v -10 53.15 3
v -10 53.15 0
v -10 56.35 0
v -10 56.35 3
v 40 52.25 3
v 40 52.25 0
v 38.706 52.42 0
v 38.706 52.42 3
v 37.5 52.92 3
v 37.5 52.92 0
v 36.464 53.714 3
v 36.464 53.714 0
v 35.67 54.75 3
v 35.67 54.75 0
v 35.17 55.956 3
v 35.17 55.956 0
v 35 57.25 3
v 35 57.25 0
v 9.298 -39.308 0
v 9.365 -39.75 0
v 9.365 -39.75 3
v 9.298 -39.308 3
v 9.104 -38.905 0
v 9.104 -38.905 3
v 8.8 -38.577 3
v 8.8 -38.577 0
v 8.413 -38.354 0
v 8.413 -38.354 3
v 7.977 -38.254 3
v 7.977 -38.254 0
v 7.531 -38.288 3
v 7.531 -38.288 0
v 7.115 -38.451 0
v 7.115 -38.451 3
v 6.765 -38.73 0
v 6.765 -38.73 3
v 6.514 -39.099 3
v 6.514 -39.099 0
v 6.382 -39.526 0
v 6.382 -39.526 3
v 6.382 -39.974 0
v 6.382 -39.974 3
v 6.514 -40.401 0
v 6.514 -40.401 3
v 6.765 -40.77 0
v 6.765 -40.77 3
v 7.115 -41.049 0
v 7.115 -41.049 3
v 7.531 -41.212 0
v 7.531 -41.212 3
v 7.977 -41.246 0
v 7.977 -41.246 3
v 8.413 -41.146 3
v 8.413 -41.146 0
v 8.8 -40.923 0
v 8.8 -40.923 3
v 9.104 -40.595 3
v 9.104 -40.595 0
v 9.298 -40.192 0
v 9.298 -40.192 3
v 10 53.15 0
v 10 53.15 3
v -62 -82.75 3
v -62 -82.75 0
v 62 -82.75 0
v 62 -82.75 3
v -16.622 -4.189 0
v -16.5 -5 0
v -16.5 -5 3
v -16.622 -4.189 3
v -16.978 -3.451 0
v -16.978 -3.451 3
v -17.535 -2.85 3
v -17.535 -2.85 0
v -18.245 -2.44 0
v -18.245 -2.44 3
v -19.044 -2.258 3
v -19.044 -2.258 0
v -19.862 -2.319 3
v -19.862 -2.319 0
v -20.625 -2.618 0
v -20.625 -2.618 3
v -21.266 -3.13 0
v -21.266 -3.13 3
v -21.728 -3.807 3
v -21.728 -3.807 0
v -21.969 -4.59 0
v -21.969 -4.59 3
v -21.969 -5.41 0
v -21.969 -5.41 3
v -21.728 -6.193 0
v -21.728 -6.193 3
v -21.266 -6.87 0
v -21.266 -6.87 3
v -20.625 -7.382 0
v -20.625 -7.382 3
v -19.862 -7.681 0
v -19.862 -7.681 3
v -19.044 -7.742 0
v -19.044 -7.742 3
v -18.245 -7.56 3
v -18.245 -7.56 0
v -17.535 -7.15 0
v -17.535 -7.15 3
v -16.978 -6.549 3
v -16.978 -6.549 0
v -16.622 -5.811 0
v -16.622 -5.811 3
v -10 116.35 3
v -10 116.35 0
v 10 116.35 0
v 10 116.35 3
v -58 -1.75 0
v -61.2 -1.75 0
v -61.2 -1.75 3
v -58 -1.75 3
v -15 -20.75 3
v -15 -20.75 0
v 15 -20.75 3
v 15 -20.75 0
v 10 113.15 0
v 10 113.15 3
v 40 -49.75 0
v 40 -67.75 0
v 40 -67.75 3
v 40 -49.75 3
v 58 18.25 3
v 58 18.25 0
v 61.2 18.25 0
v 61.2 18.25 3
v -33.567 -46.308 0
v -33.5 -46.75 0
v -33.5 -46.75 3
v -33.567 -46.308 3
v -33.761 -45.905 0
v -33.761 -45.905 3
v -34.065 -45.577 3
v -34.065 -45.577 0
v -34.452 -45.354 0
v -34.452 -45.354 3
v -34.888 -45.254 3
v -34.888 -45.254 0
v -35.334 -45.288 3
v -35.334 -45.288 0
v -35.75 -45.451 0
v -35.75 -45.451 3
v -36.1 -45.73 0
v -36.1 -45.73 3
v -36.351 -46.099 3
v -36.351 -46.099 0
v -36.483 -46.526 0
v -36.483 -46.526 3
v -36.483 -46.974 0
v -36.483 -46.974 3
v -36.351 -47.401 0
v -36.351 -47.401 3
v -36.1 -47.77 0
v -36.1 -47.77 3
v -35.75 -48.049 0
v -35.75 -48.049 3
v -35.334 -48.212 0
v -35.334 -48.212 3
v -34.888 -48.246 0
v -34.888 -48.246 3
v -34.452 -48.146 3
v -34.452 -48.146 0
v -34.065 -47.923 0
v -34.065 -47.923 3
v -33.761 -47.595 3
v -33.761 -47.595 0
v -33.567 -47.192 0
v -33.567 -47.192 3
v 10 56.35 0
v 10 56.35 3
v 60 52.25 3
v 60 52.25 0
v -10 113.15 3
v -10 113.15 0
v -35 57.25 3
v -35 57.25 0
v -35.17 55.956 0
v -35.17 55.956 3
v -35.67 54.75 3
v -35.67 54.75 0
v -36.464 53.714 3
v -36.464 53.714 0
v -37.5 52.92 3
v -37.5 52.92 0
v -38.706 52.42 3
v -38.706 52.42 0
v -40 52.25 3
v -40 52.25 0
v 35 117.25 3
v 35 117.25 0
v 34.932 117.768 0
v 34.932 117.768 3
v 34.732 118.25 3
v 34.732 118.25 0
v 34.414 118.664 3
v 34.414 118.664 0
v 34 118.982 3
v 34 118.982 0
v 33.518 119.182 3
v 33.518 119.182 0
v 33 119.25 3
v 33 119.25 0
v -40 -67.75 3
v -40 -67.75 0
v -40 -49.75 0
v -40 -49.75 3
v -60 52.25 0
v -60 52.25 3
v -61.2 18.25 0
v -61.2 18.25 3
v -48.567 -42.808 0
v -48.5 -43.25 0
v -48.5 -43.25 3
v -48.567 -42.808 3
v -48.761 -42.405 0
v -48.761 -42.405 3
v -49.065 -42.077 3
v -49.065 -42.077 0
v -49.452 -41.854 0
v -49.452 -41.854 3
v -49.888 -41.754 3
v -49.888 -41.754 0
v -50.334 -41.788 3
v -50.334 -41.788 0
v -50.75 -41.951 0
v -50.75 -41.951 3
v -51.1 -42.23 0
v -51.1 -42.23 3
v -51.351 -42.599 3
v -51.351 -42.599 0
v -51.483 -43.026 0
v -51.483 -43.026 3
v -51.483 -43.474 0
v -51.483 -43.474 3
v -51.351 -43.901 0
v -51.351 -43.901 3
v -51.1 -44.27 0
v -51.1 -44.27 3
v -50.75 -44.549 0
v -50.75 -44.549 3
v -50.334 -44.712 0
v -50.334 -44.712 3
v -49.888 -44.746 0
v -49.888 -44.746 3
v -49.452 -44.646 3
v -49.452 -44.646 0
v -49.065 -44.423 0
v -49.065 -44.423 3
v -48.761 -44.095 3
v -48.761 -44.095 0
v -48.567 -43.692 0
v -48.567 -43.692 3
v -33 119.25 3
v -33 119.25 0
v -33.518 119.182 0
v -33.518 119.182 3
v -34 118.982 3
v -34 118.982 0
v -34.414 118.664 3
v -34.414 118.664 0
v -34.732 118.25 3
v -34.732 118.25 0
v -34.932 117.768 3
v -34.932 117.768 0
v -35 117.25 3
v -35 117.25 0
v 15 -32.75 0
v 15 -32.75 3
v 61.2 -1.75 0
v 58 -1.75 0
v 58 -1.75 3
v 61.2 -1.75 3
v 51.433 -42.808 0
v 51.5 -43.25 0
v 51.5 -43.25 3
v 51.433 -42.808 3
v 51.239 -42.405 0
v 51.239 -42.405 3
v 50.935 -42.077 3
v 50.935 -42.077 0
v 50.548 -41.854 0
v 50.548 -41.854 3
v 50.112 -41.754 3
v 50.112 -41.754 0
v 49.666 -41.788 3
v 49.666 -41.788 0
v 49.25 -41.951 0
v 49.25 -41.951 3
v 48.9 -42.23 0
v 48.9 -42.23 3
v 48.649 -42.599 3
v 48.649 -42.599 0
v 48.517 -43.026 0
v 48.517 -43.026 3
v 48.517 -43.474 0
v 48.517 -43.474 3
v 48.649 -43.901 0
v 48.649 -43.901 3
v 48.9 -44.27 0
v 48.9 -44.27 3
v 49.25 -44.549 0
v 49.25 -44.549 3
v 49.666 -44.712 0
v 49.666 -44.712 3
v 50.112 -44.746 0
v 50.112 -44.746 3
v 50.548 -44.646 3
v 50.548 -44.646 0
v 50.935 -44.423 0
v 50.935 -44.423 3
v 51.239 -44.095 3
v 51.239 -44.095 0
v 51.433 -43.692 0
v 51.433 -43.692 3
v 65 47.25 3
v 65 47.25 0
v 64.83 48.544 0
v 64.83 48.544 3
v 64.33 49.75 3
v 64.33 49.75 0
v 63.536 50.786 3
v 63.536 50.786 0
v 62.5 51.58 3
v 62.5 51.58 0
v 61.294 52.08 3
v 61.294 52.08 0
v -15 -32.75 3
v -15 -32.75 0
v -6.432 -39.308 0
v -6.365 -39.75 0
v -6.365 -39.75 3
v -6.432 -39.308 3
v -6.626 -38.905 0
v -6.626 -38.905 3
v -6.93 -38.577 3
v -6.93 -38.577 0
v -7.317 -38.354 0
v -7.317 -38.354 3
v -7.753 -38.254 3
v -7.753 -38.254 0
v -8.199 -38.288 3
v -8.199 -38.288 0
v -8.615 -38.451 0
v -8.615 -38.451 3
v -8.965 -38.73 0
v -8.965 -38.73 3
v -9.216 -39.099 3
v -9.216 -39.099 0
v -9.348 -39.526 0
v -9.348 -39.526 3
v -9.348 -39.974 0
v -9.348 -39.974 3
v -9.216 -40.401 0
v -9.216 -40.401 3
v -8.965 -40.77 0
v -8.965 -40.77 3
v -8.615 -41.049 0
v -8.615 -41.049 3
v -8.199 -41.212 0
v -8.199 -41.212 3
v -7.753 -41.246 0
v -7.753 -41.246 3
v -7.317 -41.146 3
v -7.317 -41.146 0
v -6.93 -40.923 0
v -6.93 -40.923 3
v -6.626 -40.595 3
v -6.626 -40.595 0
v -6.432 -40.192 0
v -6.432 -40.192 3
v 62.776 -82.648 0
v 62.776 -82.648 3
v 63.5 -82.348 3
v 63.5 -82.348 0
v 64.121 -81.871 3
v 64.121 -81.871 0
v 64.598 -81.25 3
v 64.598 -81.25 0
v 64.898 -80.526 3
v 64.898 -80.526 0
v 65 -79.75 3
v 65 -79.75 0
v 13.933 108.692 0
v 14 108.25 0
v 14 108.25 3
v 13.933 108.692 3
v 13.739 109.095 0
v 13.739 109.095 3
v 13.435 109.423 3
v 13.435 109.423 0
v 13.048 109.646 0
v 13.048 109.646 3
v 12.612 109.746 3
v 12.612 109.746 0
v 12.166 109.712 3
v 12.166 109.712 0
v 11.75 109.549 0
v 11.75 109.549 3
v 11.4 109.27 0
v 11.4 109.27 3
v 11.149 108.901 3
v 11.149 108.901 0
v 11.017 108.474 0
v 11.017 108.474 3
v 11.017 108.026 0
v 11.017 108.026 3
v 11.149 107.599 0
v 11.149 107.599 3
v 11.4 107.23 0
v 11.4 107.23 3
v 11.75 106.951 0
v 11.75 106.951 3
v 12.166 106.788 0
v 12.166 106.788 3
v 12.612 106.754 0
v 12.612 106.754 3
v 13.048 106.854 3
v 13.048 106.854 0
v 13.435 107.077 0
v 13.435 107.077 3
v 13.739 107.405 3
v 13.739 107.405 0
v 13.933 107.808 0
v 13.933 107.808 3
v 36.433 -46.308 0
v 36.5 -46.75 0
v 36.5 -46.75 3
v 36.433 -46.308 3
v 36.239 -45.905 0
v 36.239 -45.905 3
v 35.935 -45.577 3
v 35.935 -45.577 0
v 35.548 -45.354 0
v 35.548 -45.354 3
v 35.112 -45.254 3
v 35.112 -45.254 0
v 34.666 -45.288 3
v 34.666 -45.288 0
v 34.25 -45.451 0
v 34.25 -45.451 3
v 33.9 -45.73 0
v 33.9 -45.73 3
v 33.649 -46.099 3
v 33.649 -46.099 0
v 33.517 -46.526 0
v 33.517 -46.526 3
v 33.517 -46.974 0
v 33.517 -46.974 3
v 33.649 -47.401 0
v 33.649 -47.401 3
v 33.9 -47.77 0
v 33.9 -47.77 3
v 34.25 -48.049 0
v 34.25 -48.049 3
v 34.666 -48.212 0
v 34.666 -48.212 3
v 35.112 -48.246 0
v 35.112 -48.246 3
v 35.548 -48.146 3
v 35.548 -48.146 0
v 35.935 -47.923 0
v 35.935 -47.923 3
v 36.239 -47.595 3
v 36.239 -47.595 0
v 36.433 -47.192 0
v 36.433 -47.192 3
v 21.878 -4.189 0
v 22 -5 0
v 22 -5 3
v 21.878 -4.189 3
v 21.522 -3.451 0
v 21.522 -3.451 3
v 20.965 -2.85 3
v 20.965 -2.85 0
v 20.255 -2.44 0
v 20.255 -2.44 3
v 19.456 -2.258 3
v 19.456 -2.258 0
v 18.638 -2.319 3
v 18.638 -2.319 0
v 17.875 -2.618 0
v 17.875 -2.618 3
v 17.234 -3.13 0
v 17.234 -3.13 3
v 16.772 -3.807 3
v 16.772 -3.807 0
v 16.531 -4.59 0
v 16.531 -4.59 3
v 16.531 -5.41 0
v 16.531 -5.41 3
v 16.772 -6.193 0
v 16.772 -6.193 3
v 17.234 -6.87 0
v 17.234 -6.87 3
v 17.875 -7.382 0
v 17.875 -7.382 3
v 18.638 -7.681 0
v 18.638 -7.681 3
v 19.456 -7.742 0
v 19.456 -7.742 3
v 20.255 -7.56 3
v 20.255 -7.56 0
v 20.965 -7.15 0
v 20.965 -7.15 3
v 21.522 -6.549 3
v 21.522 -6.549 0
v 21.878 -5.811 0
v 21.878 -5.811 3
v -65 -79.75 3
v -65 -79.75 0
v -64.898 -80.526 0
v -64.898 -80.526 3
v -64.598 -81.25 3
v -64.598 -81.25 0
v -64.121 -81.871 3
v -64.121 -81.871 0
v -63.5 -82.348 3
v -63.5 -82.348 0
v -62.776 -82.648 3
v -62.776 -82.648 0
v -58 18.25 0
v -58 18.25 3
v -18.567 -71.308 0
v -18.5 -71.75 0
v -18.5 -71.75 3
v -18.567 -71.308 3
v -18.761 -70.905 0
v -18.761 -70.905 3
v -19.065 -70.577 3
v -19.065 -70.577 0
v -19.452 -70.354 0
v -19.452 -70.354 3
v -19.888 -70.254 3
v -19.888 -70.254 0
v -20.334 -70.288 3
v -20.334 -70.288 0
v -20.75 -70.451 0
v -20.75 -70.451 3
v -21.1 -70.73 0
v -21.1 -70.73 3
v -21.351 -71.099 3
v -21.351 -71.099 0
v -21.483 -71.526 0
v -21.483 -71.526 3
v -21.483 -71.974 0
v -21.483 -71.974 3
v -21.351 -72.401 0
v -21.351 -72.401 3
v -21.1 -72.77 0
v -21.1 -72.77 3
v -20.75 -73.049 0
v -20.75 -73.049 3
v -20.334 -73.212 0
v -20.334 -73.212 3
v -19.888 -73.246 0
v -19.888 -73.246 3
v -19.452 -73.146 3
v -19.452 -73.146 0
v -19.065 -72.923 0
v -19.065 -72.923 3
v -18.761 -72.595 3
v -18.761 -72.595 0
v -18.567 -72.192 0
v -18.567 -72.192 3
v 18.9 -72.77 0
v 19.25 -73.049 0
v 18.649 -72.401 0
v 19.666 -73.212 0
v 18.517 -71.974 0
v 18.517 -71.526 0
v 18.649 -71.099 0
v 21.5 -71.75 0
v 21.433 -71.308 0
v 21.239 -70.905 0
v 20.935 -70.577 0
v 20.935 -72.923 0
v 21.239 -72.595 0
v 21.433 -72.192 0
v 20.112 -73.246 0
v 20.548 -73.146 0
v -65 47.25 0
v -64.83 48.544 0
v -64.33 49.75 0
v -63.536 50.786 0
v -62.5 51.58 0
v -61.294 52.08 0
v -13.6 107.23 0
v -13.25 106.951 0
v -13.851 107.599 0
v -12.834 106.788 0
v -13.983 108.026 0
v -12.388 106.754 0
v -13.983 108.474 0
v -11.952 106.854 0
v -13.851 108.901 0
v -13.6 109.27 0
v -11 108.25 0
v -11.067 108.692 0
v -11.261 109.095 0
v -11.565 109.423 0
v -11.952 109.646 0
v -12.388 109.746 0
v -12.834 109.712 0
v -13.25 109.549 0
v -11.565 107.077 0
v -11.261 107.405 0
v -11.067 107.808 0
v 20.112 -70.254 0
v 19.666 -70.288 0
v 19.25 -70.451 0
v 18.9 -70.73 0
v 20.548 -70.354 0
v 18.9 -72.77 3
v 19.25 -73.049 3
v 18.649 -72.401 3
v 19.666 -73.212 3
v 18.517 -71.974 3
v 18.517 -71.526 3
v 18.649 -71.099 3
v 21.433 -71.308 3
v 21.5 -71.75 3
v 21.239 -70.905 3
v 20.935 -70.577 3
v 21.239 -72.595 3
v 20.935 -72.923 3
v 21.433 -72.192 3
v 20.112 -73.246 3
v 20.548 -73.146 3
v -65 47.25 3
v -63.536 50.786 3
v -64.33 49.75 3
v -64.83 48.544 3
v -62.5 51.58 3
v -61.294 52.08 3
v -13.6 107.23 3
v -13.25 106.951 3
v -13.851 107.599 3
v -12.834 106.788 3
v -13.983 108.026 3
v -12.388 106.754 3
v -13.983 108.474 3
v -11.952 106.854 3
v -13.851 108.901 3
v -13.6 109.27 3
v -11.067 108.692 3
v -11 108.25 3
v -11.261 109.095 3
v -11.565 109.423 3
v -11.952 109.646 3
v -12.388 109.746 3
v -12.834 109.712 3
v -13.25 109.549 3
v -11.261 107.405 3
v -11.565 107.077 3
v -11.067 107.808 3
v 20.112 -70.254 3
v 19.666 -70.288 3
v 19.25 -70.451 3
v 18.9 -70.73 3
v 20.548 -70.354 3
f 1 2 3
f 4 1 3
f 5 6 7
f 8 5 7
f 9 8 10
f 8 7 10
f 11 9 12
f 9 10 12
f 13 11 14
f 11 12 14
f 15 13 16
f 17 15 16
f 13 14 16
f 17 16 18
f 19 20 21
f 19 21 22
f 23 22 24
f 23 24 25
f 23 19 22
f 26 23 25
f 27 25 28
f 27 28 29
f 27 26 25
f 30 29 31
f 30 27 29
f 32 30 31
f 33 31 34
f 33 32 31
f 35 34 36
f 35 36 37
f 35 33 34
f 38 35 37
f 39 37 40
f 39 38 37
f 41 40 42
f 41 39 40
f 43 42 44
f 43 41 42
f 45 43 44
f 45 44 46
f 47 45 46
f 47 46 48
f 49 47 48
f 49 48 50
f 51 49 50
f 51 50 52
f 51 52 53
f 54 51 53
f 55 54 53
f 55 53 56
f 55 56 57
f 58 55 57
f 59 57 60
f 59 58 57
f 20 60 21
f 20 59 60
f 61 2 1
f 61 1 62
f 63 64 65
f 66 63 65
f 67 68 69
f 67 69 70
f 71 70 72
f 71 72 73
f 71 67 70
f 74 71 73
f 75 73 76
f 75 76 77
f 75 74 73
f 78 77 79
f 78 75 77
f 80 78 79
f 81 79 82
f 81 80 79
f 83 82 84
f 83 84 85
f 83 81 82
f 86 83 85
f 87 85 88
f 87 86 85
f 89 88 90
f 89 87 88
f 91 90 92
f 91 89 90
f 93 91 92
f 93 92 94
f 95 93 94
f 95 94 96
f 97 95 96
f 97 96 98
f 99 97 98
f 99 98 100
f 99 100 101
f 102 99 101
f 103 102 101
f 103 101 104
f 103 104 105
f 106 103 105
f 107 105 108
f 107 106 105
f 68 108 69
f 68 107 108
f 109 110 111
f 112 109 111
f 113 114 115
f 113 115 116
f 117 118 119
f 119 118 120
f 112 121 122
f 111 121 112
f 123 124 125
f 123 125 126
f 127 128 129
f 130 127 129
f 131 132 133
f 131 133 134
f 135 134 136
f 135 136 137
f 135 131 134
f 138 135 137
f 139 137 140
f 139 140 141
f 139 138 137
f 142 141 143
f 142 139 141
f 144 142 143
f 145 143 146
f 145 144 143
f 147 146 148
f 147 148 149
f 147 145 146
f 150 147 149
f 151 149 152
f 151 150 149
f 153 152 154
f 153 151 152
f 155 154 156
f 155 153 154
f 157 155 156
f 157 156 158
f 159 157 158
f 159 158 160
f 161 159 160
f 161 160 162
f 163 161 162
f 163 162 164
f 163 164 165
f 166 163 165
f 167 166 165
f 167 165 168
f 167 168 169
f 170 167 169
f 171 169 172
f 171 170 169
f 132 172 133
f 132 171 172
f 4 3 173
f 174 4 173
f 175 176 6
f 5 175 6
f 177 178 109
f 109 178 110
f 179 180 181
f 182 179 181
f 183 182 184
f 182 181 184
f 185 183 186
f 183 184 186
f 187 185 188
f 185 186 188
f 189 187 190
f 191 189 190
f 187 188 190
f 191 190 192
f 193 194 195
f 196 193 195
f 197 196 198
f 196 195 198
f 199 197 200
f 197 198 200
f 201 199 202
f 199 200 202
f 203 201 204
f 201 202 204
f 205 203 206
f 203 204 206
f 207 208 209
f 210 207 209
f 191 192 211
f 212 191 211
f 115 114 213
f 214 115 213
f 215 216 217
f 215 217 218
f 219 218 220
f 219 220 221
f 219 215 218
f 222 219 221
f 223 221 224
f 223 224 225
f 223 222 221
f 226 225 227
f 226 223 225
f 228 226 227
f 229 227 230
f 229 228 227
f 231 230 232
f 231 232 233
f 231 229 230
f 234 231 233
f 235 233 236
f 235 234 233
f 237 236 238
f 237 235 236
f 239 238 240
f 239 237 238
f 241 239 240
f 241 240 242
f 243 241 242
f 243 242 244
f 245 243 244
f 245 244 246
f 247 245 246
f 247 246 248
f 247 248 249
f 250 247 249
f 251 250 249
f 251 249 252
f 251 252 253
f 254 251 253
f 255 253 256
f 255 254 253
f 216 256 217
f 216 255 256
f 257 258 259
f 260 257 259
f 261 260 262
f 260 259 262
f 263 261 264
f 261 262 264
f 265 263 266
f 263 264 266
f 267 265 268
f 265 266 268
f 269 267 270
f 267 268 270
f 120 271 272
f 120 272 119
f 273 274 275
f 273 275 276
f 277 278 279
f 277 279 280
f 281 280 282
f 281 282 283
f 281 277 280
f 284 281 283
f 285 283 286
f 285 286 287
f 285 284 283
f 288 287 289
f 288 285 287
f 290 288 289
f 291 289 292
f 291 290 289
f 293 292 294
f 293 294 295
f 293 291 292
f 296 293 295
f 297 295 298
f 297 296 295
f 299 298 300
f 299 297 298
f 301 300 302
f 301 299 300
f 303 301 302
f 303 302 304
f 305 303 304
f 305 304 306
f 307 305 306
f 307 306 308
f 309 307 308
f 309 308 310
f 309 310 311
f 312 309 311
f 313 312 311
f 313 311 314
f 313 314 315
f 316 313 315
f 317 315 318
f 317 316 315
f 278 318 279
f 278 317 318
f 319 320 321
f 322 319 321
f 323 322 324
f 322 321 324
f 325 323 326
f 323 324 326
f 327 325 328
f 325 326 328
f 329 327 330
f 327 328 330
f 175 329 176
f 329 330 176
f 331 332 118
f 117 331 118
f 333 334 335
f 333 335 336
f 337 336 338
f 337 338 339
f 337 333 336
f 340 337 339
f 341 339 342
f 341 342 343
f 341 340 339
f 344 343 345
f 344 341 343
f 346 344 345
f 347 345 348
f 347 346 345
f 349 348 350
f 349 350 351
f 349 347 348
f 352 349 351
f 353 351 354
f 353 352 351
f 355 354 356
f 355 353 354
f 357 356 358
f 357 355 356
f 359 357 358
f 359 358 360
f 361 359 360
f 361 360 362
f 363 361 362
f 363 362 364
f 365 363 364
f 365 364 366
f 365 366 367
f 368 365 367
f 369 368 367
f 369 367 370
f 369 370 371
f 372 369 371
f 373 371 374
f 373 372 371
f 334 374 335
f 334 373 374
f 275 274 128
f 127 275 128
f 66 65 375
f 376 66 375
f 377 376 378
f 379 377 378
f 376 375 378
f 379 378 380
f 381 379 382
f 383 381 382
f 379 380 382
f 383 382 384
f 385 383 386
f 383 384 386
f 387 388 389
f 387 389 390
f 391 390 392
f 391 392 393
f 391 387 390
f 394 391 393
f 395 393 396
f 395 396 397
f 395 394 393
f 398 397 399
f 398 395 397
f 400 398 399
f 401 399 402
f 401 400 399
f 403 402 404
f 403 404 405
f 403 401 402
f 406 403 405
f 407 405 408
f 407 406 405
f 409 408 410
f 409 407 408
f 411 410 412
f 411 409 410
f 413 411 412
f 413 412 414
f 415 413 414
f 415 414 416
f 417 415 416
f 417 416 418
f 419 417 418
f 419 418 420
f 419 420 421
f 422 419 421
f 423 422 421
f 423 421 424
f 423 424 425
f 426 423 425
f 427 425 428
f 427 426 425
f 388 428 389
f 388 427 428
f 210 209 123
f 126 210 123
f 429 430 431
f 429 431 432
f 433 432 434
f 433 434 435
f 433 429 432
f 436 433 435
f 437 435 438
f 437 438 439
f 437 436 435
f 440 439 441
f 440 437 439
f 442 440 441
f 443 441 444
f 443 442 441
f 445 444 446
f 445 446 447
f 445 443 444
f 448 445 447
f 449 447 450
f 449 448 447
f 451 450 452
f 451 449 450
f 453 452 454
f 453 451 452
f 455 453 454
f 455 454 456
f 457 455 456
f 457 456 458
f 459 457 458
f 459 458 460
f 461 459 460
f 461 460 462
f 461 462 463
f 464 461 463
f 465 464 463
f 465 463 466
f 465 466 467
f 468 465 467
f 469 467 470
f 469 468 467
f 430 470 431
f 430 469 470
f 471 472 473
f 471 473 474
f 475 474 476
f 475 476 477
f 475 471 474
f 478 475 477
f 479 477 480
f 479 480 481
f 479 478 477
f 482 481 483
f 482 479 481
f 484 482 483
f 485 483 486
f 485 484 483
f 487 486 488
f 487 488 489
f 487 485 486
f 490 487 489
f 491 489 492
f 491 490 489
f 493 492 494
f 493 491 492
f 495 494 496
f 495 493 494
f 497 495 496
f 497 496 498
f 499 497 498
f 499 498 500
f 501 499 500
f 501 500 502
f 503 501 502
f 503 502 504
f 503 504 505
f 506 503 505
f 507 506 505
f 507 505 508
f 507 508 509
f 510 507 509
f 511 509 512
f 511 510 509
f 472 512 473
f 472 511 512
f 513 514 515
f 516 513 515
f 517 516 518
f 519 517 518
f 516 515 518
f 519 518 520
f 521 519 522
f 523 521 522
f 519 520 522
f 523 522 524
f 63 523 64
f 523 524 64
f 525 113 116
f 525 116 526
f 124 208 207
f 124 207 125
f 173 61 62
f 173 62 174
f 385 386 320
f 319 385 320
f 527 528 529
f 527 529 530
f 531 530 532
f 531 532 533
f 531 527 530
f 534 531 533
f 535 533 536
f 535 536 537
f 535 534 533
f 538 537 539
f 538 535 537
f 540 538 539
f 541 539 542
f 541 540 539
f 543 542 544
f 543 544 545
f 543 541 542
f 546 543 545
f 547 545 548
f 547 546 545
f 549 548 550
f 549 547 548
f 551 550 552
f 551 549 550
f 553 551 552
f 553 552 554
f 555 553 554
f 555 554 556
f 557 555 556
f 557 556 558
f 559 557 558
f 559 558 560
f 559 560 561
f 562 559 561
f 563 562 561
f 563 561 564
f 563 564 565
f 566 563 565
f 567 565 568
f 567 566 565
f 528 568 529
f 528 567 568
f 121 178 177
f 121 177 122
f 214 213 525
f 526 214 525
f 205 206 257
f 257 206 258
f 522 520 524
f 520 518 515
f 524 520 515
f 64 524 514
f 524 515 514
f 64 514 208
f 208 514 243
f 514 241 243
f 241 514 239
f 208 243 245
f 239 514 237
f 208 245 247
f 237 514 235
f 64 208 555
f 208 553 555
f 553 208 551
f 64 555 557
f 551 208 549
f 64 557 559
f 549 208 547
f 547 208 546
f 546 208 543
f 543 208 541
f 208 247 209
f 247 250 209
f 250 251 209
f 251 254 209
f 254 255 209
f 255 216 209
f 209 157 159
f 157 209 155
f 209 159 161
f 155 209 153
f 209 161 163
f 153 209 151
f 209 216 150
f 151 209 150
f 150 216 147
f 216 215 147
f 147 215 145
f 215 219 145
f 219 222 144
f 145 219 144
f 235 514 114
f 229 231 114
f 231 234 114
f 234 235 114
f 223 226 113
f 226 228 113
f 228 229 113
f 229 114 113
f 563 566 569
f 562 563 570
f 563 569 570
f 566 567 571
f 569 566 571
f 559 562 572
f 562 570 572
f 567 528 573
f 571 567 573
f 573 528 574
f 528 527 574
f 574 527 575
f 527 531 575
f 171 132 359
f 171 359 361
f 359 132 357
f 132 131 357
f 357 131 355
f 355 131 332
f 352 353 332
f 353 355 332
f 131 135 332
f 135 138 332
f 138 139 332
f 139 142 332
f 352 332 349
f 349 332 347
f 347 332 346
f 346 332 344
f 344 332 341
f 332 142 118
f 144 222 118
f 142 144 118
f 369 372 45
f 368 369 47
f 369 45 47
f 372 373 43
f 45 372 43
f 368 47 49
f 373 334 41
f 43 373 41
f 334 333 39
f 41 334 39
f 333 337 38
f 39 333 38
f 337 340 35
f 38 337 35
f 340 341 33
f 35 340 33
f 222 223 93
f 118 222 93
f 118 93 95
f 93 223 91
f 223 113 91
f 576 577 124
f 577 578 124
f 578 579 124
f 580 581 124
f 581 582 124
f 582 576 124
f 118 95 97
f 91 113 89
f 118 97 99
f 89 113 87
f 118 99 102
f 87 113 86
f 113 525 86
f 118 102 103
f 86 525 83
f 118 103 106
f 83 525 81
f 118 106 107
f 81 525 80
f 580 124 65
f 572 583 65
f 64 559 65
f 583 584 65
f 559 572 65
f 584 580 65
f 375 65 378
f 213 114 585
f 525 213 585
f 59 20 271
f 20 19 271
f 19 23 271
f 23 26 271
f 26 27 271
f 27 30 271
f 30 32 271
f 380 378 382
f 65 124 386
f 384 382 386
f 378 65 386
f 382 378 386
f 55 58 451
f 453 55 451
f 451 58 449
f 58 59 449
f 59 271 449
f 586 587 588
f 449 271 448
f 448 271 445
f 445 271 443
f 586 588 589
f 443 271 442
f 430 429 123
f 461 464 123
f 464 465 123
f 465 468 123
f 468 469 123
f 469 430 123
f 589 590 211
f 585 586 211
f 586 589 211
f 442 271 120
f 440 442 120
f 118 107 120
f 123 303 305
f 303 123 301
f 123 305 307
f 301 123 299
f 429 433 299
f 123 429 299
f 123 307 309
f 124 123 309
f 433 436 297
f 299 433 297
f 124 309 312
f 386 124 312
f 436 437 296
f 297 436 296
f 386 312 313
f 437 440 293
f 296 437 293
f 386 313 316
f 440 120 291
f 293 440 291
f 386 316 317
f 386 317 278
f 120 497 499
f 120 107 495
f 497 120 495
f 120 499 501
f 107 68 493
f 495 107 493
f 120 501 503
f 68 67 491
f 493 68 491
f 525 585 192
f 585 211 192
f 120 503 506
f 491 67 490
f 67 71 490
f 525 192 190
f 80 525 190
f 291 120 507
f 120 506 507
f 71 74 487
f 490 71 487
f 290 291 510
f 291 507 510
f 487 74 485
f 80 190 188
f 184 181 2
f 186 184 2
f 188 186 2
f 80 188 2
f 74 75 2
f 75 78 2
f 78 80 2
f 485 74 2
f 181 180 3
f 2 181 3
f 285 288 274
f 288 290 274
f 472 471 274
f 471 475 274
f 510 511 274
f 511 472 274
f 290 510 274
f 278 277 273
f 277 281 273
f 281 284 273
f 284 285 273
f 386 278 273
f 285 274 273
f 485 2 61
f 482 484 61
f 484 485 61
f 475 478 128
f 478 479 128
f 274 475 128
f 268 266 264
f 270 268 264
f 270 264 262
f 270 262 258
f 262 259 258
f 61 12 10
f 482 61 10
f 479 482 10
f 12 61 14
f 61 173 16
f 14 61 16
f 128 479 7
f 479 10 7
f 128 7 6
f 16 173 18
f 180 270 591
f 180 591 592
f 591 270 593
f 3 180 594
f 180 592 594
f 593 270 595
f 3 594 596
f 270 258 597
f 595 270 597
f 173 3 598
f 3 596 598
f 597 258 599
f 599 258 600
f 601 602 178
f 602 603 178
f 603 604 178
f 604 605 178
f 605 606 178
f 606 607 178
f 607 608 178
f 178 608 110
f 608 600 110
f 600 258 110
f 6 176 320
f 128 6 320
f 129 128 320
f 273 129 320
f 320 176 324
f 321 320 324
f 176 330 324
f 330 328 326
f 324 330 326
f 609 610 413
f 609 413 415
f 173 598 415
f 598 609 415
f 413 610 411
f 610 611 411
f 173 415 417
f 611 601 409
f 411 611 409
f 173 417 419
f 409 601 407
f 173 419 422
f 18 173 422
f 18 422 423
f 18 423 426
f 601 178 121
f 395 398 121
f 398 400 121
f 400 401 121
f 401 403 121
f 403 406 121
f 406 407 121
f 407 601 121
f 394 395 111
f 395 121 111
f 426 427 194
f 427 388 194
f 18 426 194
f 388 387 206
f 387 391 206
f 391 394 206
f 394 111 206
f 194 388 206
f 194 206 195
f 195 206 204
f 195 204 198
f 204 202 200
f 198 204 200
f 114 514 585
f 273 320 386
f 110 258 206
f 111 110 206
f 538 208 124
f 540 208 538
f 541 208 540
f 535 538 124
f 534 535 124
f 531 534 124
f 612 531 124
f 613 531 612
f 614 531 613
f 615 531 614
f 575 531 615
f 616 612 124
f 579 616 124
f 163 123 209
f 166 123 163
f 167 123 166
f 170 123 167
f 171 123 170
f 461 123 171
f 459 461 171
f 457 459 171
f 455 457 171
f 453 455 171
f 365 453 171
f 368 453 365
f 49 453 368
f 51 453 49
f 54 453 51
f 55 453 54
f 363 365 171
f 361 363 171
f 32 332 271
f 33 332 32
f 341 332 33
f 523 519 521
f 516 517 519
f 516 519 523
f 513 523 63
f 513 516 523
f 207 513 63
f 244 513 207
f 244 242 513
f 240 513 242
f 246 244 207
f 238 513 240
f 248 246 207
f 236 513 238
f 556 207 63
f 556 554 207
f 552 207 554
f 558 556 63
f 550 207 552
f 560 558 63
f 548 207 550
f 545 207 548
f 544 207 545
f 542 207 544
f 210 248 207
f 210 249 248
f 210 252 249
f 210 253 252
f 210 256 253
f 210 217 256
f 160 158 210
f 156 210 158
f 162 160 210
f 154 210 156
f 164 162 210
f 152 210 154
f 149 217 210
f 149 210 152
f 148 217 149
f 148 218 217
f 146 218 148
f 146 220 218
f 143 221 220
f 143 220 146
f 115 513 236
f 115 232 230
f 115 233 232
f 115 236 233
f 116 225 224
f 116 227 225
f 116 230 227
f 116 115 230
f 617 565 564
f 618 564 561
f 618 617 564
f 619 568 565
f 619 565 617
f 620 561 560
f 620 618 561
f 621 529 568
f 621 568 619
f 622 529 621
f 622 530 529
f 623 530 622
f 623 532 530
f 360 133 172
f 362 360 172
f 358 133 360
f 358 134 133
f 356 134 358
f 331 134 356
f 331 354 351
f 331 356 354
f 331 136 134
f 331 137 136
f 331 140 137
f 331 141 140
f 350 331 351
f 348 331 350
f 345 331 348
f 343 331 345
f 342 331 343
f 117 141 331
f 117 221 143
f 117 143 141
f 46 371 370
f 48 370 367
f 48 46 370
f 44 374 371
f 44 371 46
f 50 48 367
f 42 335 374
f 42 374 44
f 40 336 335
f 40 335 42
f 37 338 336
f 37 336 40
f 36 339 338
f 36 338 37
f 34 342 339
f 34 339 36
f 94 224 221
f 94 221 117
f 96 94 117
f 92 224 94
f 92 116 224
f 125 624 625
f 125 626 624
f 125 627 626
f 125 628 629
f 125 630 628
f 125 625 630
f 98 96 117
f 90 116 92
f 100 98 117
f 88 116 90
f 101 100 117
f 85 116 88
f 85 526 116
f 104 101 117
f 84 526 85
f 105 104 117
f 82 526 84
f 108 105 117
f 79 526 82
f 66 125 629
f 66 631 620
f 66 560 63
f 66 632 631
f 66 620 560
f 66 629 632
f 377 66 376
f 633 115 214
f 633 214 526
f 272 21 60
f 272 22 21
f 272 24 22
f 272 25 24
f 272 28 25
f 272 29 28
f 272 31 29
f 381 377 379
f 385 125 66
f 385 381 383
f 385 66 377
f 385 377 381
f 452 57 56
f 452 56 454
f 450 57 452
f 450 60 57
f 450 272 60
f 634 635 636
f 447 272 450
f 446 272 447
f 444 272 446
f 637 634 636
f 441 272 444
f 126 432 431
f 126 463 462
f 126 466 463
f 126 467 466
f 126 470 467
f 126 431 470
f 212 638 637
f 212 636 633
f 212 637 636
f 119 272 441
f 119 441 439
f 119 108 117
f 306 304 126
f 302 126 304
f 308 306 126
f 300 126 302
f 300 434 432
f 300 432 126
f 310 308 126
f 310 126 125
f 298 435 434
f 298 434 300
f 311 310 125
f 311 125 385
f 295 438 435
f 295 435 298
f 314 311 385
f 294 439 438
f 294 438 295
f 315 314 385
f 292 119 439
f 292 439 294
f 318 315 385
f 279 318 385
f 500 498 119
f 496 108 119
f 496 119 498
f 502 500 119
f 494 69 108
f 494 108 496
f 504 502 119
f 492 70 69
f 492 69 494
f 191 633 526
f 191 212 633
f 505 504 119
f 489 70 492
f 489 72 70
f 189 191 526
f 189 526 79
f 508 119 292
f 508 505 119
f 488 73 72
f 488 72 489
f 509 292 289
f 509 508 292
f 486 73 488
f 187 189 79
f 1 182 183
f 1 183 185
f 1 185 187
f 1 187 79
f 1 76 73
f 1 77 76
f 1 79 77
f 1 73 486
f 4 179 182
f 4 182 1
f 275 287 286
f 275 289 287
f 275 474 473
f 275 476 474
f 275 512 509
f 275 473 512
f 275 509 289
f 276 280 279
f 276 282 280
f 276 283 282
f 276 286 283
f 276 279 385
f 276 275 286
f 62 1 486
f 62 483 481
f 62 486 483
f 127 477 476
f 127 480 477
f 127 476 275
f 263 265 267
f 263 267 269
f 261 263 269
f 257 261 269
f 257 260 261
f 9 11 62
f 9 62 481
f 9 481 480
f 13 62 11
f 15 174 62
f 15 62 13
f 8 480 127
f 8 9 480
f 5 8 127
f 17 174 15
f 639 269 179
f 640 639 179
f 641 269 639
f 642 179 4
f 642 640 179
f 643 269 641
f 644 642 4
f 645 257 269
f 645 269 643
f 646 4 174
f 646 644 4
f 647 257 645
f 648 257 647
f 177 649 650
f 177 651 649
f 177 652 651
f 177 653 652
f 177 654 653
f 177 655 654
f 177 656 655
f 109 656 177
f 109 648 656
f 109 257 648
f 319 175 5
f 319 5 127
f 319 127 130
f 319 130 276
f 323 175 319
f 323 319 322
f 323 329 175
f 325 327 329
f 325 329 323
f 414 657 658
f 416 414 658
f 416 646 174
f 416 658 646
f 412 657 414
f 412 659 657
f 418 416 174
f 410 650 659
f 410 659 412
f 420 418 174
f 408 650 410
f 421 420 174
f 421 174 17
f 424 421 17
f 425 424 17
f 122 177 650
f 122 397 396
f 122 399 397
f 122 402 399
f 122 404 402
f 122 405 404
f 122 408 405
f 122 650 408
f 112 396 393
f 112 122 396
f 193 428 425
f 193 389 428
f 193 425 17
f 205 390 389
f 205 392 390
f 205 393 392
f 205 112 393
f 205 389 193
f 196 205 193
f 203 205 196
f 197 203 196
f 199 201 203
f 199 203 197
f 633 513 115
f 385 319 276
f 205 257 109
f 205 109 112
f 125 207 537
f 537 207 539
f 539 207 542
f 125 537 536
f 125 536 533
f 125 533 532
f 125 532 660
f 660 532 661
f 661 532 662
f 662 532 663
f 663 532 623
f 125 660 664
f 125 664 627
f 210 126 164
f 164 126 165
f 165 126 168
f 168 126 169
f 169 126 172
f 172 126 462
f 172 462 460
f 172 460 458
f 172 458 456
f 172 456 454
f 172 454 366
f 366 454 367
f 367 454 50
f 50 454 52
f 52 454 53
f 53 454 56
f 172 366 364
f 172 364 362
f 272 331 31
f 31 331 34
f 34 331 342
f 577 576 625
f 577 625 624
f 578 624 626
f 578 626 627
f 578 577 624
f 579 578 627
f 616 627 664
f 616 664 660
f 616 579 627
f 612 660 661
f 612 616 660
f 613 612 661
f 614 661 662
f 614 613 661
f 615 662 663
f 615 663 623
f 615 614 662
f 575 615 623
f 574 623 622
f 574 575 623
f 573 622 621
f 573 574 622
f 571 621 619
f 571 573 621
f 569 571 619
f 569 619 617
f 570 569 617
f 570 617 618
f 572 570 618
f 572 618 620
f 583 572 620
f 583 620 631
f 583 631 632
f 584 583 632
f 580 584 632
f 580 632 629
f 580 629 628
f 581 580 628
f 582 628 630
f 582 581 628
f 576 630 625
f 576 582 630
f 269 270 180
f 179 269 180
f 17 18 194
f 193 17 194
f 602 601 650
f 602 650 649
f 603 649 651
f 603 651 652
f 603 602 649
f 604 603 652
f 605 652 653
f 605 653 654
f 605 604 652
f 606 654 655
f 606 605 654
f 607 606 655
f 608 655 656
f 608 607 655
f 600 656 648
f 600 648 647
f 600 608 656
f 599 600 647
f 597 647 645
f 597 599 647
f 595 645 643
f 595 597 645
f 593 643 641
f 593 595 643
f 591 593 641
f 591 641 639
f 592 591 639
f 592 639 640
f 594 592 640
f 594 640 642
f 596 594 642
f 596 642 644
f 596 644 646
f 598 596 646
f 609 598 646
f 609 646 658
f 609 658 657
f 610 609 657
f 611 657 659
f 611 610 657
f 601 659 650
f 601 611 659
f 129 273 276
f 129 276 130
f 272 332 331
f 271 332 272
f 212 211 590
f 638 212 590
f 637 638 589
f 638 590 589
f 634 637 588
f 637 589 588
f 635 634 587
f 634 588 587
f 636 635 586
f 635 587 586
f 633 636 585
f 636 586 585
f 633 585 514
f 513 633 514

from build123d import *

# Parameters (mm, degrees)
SKETCH1_R           = 1.5
SKETCH1_R_2         = 2.75
SKETCH1_W           = 3.2
SKETCH1_H           = 20
SKETCH1_W_2         = 20
SKETCH1_H_2         = 3.2
SKETCH1_W_3         = 80
SKETCH1_H_3         = 18
SKETCH1_W_4         = 30
SKETCH1_H_4         = 12
BOSS_EXTRUDE2_DEPTH = 3


with BuildPart() as part:
    # Sketch1 → Boss-Extrude2 (new body)
    with BuildSketch(Plane.XY):
        with BuildLine():
            Line((-35, 117.25), (-35, 57.25))
            ThreePointArc((-35, 57.25), (-36.464466094, 53.714466094), (-40, 52.25))
            Line((-40, 52.25), (-60, 52.25))
            ThreePointArc((-60, 52.25), (-63.535533906, 50.785533906), (-65, 47.25))
            Line((-65, 47.25), (-65, -79.75))
            ThreePointArc((-65, -79.75), (-64.121320344, -81.871320344), (-62, -82.75))
            Line((-62, -82.75), (62, -82.75))
            ThreePointArc((62, -82.75), (64.121320344, -81.871320344), (65, -79.75))
            Line((65, -79.75), (65, 47.25))
            ThreePointArc((65, 47.25), (63.535533906, 50.785533906), (60, 52.25))
            Line((60, 52.25), (40, 52.25))
            ThreePointArc((40, 52.25), (36.464466094, 53.714466094), (35, 57.25))
            Line((35, 57.25), (35, 117.25))
            ThreePointArc((35, 117.25), (34.414213562, 118.664213562), (33, 119.25))
            Line((33, 119.25), (-33, 119.25))
            ThreePointArc((-33, 119.25), (-34.414213562, 118.664213562), (-35, 117.25))
        make_face()
        with Locations((-20, -71.75)):
            Circle(SKETCH1_R, mode=Mode.SUBTRACT)
        with Locations((20, -71.75)):
            Circle(SKETCH1_R, mode=Mode.SUBTRACT)
        with Locations((-35, -46.75)):
            Circle(SKETCH1_R, mode=Mode.SUBTRACT)
        with Locations((35, -46.75)):
            Circle(SKETCH1_R, mode=Mode.SUBTRACT)
        with Locations((-7.865, -39.75)):
            Circle(SKETCH1_R, mode=Mode.SUBTRACT)
        with Locations((7.865, -39.75)):
            Circle(SKETCH1_R, mode=Mode.SUBTRACT)
        with Locations((-19.25, -5)):
            Circle(SKETCH1_R_2, mode=Mode.SUBTRACT)
        with Locations((19.25, -5)):
            Circle(SKETCH1_R_2, mode=Mode.SUBTRACT)
        with Locations((-50, -43.25)):
            Circle(SKETCH1_R, mode=Mode.SUBTRACT)
        with Locations((50, -43.25)):
            Circle(SKETCH1_R, mode=Mode.SUBTRACT)
        with Locations((-12.5, 108.25)):
            Circle(SKETCH1_R, mode=Mode.SUBTRACT)
        with Locations((12.5, 108.25)):
            Circle(SKETCH1_R, mode=Mode.SUBTRACT)
        with Locations((59.6, 8.25)):
            Rectangle(SKETCH1_W, SKETCH1_H, mode=Mode.SUBTRACT)
        with Locations((-59.6, 8.25)):
            Rectangle(SKETCH1_W, SKETCH1_H, mode=Mode.SUBTRACT)
        with Locations((0, 54.75)):
            Rectangle(SKETCH1_W_2, SKETCH1_H_2, mode=Mode.SUBTRACT)
        with Locations((0, -58.75)):
            Rectangle(SKETCH1_W_3, SKETCH1_H_3, mode=Mode.SUBTRACT)
        with Locations((0, -26.75)):
            Rectangle(SKETCH1_W_4, SKETCH1_H_4, mode=Mode.SUBTRACT)
        with Locations((0, 114.75)):
            Rectangle(SKETCH1_W_2, SKETCH1_H_2, mode=Mode.SUBTRACT)
    extrude(amount=BOSS_EXTRUDE2_DEPTH)


solid = part.part
